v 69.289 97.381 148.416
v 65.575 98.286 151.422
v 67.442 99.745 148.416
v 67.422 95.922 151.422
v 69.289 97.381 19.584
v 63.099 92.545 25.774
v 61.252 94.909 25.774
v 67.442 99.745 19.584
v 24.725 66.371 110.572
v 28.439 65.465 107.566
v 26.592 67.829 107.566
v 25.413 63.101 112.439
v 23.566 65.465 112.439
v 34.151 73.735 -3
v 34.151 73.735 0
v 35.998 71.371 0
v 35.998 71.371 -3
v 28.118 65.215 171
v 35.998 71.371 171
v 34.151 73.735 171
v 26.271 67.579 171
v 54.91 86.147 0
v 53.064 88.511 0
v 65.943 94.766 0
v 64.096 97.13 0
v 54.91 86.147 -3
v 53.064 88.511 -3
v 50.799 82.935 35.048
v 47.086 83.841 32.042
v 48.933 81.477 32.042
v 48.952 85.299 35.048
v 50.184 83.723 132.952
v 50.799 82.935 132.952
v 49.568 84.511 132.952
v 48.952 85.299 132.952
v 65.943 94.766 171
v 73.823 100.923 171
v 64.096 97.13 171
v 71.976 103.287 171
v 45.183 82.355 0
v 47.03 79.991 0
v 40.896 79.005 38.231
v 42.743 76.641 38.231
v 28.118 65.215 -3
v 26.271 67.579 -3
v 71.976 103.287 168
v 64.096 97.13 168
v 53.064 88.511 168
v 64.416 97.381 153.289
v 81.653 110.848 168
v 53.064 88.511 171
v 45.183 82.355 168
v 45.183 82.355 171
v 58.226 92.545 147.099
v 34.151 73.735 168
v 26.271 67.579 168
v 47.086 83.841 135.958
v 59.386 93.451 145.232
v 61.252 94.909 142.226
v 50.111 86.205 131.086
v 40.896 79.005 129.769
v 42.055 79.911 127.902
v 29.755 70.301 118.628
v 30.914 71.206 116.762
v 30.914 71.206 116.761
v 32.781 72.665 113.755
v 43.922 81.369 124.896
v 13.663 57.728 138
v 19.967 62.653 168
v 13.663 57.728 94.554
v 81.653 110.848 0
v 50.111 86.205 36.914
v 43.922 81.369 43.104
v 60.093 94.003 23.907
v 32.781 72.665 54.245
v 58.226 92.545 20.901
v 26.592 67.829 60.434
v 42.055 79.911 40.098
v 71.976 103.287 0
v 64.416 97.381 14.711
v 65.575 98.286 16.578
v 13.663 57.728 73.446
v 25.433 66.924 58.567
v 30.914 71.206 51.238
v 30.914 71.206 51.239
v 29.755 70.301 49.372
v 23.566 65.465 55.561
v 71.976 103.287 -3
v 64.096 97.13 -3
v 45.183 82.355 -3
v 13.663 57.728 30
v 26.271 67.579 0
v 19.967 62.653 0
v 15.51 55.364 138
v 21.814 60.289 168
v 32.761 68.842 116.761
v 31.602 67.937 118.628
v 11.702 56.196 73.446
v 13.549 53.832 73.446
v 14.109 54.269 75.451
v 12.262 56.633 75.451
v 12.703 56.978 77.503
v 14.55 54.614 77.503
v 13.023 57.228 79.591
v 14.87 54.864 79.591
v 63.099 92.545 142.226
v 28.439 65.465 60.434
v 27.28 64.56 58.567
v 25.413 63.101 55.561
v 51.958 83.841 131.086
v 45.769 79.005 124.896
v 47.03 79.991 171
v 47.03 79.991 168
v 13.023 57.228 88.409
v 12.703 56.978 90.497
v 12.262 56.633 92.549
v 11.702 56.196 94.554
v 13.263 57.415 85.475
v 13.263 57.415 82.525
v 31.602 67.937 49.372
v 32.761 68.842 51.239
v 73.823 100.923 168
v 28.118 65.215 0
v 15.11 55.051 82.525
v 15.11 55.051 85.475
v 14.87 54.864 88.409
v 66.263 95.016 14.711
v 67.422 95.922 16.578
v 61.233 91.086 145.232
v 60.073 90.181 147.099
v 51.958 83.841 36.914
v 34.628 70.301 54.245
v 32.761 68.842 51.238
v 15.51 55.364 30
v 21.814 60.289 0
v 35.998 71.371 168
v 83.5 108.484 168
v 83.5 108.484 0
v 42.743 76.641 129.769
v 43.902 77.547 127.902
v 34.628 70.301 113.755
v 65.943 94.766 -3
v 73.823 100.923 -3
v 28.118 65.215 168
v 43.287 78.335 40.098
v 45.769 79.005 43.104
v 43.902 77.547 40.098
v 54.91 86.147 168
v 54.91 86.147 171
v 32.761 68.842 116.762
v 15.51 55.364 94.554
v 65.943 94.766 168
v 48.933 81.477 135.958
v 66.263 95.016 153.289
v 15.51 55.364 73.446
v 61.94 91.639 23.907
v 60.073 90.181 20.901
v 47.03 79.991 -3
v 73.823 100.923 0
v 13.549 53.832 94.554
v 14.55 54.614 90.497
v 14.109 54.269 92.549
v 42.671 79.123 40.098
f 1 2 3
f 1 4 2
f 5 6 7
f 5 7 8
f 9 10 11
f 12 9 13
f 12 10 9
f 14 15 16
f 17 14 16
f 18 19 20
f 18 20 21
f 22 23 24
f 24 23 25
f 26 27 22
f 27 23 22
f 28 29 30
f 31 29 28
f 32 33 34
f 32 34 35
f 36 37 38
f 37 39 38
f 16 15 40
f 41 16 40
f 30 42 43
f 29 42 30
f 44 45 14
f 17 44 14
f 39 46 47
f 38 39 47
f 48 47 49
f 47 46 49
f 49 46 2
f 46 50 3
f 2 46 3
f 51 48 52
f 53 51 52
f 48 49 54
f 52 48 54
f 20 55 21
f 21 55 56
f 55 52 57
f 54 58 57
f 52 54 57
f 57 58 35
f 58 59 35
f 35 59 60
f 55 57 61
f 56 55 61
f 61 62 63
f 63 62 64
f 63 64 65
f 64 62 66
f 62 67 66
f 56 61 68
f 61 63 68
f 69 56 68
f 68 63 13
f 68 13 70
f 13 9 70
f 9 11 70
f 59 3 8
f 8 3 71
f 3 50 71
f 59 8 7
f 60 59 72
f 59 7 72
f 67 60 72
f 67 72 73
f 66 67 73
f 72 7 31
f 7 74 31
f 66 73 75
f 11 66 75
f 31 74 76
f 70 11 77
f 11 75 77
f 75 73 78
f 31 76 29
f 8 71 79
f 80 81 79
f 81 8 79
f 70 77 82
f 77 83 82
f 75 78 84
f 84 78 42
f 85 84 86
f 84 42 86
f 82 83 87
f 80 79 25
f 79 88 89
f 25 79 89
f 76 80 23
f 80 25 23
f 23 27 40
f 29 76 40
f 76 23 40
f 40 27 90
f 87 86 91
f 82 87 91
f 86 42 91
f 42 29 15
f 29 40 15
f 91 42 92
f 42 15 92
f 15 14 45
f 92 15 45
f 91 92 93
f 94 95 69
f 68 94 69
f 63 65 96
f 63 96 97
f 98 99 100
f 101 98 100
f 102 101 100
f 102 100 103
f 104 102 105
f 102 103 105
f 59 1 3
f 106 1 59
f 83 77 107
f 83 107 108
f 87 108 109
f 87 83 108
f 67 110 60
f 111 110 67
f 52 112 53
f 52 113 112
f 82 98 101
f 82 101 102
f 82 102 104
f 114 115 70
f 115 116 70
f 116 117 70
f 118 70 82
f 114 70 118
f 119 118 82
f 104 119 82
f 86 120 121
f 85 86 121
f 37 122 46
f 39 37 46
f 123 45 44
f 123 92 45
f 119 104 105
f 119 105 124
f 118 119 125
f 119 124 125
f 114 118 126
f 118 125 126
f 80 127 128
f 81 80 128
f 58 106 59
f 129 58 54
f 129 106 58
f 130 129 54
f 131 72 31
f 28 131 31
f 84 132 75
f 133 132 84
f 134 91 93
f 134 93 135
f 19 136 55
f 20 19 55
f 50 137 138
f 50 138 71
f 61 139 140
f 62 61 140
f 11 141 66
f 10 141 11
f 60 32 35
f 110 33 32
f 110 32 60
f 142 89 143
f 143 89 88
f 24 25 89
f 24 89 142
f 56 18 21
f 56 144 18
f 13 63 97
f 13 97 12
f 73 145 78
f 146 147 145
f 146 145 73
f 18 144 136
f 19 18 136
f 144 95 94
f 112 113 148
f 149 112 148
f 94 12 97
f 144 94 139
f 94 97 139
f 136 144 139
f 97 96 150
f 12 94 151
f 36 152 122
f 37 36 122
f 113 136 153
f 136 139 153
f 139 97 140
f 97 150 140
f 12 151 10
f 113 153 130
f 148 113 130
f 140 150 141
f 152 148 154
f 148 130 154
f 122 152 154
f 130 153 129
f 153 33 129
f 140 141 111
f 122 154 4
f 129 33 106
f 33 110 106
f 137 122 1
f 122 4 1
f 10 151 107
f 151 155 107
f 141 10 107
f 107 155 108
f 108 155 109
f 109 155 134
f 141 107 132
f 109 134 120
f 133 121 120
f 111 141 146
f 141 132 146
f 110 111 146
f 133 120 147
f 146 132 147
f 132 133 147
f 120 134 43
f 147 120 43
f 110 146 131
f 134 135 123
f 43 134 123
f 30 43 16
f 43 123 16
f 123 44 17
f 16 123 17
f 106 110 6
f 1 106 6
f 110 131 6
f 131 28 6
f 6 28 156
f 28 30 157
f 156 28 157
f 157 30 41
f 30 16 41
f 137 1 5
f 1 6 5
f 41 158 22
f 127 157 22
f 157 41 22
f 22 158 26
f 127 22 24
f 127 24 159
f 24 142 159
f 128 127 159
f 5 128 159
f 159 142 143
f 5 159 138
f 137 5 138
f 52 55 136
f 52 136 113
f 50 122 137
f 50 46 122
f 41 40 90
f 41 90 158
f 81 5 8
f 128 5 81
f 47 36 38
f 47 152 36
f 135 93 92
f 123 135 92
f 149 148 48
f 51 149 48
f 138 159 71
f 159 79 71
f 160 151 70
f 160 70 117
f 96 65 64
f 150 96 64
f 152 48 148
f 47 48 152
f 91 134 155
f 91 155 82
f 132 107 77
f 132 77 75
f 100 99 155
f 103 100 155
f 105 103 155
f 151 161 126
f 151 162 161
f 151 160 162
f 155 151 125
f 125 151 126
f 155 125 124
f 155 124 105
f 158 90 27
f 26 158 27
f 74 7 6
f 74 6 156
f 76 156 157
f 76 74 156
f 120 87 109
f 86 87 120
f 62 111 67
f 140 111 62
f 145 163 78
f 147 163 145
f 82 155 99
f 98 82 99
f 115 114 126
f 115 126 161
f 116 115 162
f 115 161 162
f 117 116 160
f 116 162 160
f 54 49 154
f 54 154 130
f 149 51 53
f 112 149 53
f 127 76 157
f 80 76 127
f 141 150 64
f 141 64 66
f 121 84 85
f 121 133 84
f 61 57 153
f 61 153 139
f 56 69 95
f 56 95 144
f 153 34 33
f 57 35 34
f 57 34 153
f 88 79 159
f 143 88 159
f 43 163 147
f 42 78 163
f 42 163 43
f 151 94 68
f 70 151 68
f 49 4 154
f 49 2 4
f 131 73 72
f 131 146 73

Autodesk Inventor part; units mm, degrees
ref_plane "YZ Plane" through (0, 0, 0) normal (1, 0, 0) x (0, 1, 0)
ref_plane "XZ Plane" through (0, 0, 0) normal (0, 1, 0) x (-1, 0, 0)
sketch "Sketch1" plane through (0, 0, 0) normal (0, 0, 1) x (1, 0, 0)
  line L0 (84, 150) -> (84, -150) projected
  line L1 (-84, 150) -> (-84, -150) projected
  line L2 (-84, 150) -> (84, 150) projected
  line L3 (-15.51, 54.8641) -> (15.51, 54.8641) projected
  line L4 (0, 0) -> (0, 174.1286) construction
  line L5 (15.51, 55.3641) -> (83.5, 108.4837)
  line L6 (15.51, 54.8641) -> (15.51, 55.3641) construction
  line L7 (81.653, 110.8478) -> (13.663, 57.7281)
  line L8 (83.5, 108.4837) -> (81.653, 110.8478)
  line L9 (15.51, 55.3641) -> (13.663, 57.7281)
  line L10 (15.51, 55.3641) -> (0, 55.3641)
  line L11 (13.663, 57.7281) -> (0, 57.7281)
  line L12 (81.653, 110.8478) -> (0, 110.8478)
  line L13 (26.2712, 67.5787) -> (28.1182, 65.2147)
  line L14 (34.1513, 73.7353) -> (35.9983, 71.3713)
  line L15 (53.0636, 88.5112) -> (54.9105, 86.1472)
  line L16 (45.1834, 82.3546) -> (47.0304, 79.9906)
  line L17 (71.9758, 103.2871) -> (73.8228, 100.9231)
  line L18 (64.0957, 97.1305) -> (65.9427, 94.7664)
  dimension "d0" = 0.5
  dimension "d1" = 0.5
  dimension "d2" = 38
  dimension "d3" = 3
  dimension "d4" = 10
  dimension "d5" = 16
  dimension "d8" = 24
extrude "Extrusion1" add sketch "Sketch1" along normal blind 168
sketch "Sketch2" plane through (13.663, 57.7281, 168) normal (-0.6157, 0.788, 0) x (0.788, 0.6157, 0)
  line L0 (-3.8398, 68.49) -> (0, 70.337)
  line L1 (0, 70.337) -> (0, 65.4642)
  line L2 (0, 65.4642) -> (12.5671, 55.5612)
  line L3 (12.5671, 55.5612) -> (14.9359, 58.5673)
  line L4 (14.9359, 58.5673) -> (22.7903, 52.378)
  line L5 (22.7903, 52.378) -> (20.4215, 49.3718)
  line L6 (20.4215, 49.3718) -> (12.5671, 55.5612)
  line L7 (0, 65.4642) -> (-3.8398, 68.49)
  line L8 (20.4215, 49.3718) -> (34.5594, 38.231)
  line L9 (34.5594, 38.231) -> (36.9283, 41.2371)
  line L10 (36.9283, 41.2371) -> (44.7827, 35.0477)
  line L11 (44.7827, 35.0477) -> (42.4138, 32.0416)
  line L12 (42.4138, 32.0416) -> (34.5594, 38.231)
  line L13 (42.4138, 32.0416) -> (56.5518, 20.9008)
  line L14 (56.5518, 20.9008) -> (58.9206, 23.9069)
  line L15 (58.9206, 23.9069) -> (66.775, 17.7175)
  line L16 (66.775, 17.7175) -> (64.4062, 14.7114)
  line L17 (64.4062, 14.7114) -> (56.5518, 20.9008)
  line L18 (64.4062, 14.7114) -> (82.4407, 0.5)
  point P0 (-46.3076, 168)
sketch "Sketch4" plane through (83.5, 108.4837, 0) normal (0.6157, -0.788, 0) x (0.788, 0.6157, 0)
  line L0 (-64.3881, 116.7615) -> (-62.0193, 113.7554)
  line L1 (-62.0193, 113.7554) -> (-69.8737, 107.566)
  line L2 (-69.8737, 107.566) -> (-72.2425, 110.5721)
  line L3 (-72.2425, 110.5721) -> (-64.3881, 116.7615)
  line L4 (-42.3958, 134.0917) -> (-40.0269, 131.0856)
  line L5 (-40.0269, 131.0856) -> (-47.8813, 124.8962)
  line L6 (-47.8813, 124.8962) -> (-50.2502, 127.9023)
  line L7 (-50.2502, 127.9023) -> (-42.3958, 134.0917)
  line L8 (-20.4034, 151.4219) -> (-18.0345, 148.4158)
  line L9 (-18.0345, 148.4158) -> (-25.889, 142.2264)
  line L10 (-25.889, 142.2264) -> (-28.2578, 145.2325)
  line L11 (-28.2578, 145.2325) -> (-20.4034, 151.4219)
  point P0 (-132.5881, 0)
extrude "Extrusion2" cut sketch "Sketch4" against normal blind 10
extrude "Extrusion3" cut sketch "Sketch2" against normal blind 10 contours L14 L15 L16 L17 | L9 L10 L11 L12 | L3 L4 L5 L6
ref_plane "Work Plane1" through (0, 0, 84) normal (0, 0, 1) x (1, 0, 0)
extrude "Extrusion4" add sketch "Sketch1" against normal blind 3 contours L13 L7 L14 L5 | L16 L7 L15 L5 | L18 L7 L17 L5
mirror "Mirror1" about plane through (0, 0, 84) normal (0, 0, 1) of "Extrusion3", "Extrusion2", "Extrusion4"
sketch "Sketch5" plane through (83.5, 108.4837, 0) normal (0.6157, -0.788, 0) x (0.788, 0.6157, 0)
  arc A0 (-87.0927, 88.4093) -> (-87.0927, 79.5907) centre (-115.3496, 84) ccw
  ellipse E0 centre (-105.963, 84) end of major axis (-125.6455, 84) minor radius 15.51 (-87.0927, 88.4093) -> (-92.8236, 95.5479) ccw construction
  arc A1 (-92.8236, 95.5479) -> (-92.8236, 72.4521) centre (-115.3496, 84) ccw construction
  ellipse E1 centre (-105.963, 84) end of major axis (-125.6455, 84) minor radius 15.51 (-92.8236, 72.4521) -> (-87.0927, 79.5907) ccw construction
  ellipse E2 centre (-108.0655, 93.2437) end of major axis (-130.5282, 110.9446) minor radius 17.7588 (-109.3091, 73.4457) -> (-87.7759, 73.4457) ccw projected
  line L0 (-84.8251, 67.3112) -> (-87.7759, 73.4457) projected
  ellipse E3 centre (-108.0655, 74.7563) end of major axis (-130.5282, 57.0554) minor radius 17.7588 (-87.7759, 94.5543) -> (-109.3091, 94.5543) ccw projected
  line L1 (-84.8251, 100.6888) -> (-87.7759, 94.5543) projected
  line L2 (-86.2805, 0) -> (-86.2805, 168) projected
  line L3 (-86.2805, 73.4457) -> (-88.7695, 73.4457)
  line L4 (-86.2805, 94.5543) -> (-88.7695, 94.5543)
  circle A2 centre (-115.3496, 84) radius 28.5989
  point P0 (-132.5881, 0)
  point P1 (-87.0927, 79.5907)
  point P2 (-87.0927, 88.4093)
extrude "Extrusion5" add sketch "Sketch5" against normal up to surface (3 mm away) contours A0 L4 L2 L3 A2
chamfer "Chamfer1" distance 30 distance2 8 1 edges at (14.5865, 56.5461, 0) measured on face at (14.2787, 56.9401, 48.9638)
chamfer "Chamfer2" distance 8 distance2 30 1 edges at (14.5865, 56.5461, 168) measured on face at (18.4814, 60.2237, 168)
properties part number "Tolva_Largo"
